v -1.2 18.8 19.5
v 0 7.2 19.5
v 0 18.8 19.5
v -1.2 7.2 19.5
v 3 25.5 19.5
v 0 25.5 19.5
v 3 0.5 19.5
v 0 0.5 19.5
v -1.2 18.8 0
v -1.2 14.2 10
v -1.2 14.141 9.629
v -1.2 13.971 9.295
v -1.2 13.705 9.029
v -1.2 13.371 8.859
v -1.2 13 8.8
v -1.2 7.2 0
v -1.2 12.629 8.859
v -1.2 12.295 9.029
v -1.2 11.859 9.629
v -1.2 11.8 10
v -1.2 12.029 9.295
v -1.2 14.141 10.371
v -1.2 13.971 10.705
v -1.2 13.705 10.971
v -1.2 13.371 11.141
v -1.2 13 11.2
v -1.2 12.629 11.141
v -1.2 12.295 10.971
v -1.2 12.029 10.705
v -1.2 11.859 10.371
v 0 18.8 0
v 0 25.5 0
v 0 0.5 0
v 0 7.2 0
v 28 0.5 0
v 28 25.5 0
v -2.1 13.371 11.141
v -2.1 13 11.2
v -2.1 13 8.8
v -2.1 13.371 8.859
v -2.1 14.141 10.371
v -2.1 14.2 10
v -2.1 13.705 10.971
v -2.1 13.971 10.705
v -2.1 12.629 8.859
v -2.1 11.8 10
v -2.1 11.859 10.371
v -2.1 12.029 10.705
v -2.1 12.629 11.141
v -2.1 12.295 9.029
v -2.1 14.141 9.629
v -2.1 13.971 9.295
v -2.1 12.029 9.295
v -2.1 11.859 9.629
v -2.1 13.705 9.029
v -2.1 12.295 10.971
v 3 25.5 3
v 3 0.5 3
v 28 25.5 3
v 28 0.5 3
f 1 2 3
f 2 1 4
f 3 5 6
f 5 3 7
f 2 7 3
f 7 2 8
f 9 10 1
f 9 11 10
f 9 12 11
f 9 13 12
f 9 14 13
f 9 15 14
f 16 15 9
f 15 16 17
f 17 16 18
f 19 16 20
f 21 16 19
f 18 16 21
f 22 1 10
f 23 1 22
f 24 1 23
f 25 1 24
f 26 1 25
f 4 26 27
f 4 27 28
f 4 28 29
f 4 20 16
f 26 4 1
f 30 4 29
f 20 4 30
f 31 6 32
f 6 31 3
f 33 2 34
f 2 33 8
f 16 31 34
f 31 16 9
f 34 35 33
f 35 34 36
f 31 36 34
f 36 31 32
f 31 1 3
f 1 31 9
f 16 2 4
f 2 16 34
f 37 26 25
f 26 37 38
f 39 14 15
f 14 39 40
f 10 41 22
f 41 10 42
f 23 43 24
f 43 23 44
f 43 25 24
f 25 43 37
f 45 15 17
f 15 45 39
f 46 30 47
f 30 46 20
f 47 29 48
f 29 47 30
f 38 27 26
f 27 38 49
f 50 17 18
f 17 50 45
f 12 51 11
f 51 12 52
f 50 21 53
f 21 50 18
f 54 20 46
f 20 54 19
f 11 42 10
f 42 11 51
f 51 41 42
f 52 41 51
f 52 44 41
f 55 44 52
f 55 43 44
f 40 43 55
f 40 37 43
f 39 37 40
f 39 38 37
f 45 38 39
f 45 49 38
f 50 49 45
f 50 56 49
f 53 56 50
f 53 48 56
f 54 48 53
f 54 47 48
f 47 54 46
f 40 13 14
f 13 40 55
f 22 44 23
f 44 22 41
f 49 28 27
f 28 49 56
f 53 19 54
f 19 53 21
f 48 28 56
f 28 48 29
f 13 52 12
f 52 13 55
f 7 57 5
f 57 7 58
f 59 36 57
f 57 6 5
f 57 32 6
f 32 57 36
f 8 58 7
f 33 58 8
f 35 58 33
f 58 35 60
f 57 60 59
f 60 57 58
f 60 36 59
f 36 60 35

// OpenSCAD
// file: wall-gap-common.scad
// Shared numbers and modules for every wall-gap trim piece. Change a number here and
// re-render all of them. Measurements in mm.
//
// Cross-section (across the strip): 0 is the wall, `gap` is the desk's edge, the strip
// rests `ontop` on the desk beyond that. A `lip` hangs into the gap against the desk's raw
// back edge and takes the #4 screws, 14 mm below the surface. Every end has a pocket on the
// underside, over the gap, for a connector tile (wall-gap-connector.scad) with two press-fit
// pins: butt two pieces together, push a tile up into both pockets, and the joint cannot
// step or bow. The pin holes are blind, so nothing shows on top.

gap   = 29;    // reach from the desk's edge to the wall: design gap 30 minus 1. Set to the smallest measured gap minus 1.
ontop = 12;    // how far it rests on the desk surface
th    = 3;     // plate thickness
lip   = 20;    // lip hanging into the gap
lip_t = 3;
chamf = 1.5;   // chamfer on the two long top edges (never on the ends, so butt joints stay hairlines)
screw = 3.2;   // #4 clearance
csk   = 6.5;
hole_z = -14;  // screw centre below the desk surface: the board's mid-plane

// connector pocket: on the underside of the gap part, at each end
pocket_l = 20; pocket_w = 12; pocket_d = 1.2;
pin_hole = 2.5; pin_depth = 1.0; pin_from_end = 10;
pocket_y = (gap - lip_t) / 2;   // centred across the gap part (between the wall edge and the lip)

module profile() { polygon([[0, 0], [gap + ontop, 0], [gap + ontop, th - chamf], [gap + ontop - chamf, th], [chamf, th], [0, th - chamf]]); }
module lip_holes(xs) { for (x = xs) translate([x, gap - lip_t - 1, hole_z]) rotate([-90, 0, 0]) { cylinder(d = screw, h = lip_t + 2, $fn = 24); translate([0, 0, 1 - 0.01]) cylinder(d1 = csk, d2 = screw, h = (csk - screw) / 2 + 0.01, $fn = 24); } }
// pockets at x = 0 (the start) and x = len (the end) of a piece running along x
module end_pockets(len) {
    for (e = [0, 1]) {
        x0 = e == 0 ? -1 : len - pocket_l;
        translate([x0, pocket_y - pocket_w / 2, -1]) cube([pocket_l + 1, pocket_w, pocket_d + 1]);
        xp = e == 0 ? pin_from_end : len - pin_from_end;
        translate([xp, pocket_y, -1]) cylinder(d = pin_hole, h = pocket_d + pin_depth + 1, $fn = 20);
    }
}
module plain_strip(len) {
    difference() {
        union() {
            rotate([90, 0, 90]) linear_extrude(len) profile();
            translate([0, gap - lip_t, -lip]) cube([len, lip_t, lip]);
        }
        lip_holes(len >= 120 ? [40, len - 40] : [len / 2]);
        end_pockets(len);
    }
}
// main file
// End cap for the wall-gap trim. The chain's last piece ends at the top's far end and the
// gap is open there: from the side you see the raw back edge. This clips into the connector
// pocket of ANY strip end (one pin, like half a connector tile), so it works on either wall
// and either end, no handed parts. A 3 mm slab sits under the plate across the gap, between
// the wall side and the lip, and an end wall drops the full top thickness (28 mm) flush with
// the strip's end, closing the gap. Nothing shows on top. Print 2. A drop of CA glue if loose.
// Print as saved: end wall flat on the bed, slab and tile standing, pin horizontal.

include <wall-gap-common.scad>
drop = 28;                        // EKBACKEN thickness: the wall ends at the top's underside
tile_l = pocket_l - 0.5; tile_w = pocket_w - 0.4; pin_d = pin_hole - 0.1;
cap_w = gap - lip_t - 1;          // across the gap part, 0.5 mm clear of the wall side and the lip
slab_t = 3;
// use orientation: x along the strip, outer end at x = 0, plate underside at z = 0, wall side at y = 0
module cap() {
    cy = (gap - lip_t) / 2;                                               // = pocket_y, centre line of the gap part
    translate([0, cy - tile_w / 2, 0]) cube([tile_l, tile_w, pocket_d]);  // tile up into the pocket
    translate([pin_from_end, cy, pocket_d]) cylinder(d = pin_d, h = pin_depth - 0.1, $fn = 20);
    translate([0, cy - cap_w / 2, -slab_t]) cube([tile_l, cap_w, slab_t]);  // slab under the plate
    translate([0, cy - cap_w / 2, -drop]) cube([th, cap_w, drop]);          // end wall, flush with the strip's end
}
rotate([0, -90, 0]) cap();   // end wall onto the bed, slab and tile standing
